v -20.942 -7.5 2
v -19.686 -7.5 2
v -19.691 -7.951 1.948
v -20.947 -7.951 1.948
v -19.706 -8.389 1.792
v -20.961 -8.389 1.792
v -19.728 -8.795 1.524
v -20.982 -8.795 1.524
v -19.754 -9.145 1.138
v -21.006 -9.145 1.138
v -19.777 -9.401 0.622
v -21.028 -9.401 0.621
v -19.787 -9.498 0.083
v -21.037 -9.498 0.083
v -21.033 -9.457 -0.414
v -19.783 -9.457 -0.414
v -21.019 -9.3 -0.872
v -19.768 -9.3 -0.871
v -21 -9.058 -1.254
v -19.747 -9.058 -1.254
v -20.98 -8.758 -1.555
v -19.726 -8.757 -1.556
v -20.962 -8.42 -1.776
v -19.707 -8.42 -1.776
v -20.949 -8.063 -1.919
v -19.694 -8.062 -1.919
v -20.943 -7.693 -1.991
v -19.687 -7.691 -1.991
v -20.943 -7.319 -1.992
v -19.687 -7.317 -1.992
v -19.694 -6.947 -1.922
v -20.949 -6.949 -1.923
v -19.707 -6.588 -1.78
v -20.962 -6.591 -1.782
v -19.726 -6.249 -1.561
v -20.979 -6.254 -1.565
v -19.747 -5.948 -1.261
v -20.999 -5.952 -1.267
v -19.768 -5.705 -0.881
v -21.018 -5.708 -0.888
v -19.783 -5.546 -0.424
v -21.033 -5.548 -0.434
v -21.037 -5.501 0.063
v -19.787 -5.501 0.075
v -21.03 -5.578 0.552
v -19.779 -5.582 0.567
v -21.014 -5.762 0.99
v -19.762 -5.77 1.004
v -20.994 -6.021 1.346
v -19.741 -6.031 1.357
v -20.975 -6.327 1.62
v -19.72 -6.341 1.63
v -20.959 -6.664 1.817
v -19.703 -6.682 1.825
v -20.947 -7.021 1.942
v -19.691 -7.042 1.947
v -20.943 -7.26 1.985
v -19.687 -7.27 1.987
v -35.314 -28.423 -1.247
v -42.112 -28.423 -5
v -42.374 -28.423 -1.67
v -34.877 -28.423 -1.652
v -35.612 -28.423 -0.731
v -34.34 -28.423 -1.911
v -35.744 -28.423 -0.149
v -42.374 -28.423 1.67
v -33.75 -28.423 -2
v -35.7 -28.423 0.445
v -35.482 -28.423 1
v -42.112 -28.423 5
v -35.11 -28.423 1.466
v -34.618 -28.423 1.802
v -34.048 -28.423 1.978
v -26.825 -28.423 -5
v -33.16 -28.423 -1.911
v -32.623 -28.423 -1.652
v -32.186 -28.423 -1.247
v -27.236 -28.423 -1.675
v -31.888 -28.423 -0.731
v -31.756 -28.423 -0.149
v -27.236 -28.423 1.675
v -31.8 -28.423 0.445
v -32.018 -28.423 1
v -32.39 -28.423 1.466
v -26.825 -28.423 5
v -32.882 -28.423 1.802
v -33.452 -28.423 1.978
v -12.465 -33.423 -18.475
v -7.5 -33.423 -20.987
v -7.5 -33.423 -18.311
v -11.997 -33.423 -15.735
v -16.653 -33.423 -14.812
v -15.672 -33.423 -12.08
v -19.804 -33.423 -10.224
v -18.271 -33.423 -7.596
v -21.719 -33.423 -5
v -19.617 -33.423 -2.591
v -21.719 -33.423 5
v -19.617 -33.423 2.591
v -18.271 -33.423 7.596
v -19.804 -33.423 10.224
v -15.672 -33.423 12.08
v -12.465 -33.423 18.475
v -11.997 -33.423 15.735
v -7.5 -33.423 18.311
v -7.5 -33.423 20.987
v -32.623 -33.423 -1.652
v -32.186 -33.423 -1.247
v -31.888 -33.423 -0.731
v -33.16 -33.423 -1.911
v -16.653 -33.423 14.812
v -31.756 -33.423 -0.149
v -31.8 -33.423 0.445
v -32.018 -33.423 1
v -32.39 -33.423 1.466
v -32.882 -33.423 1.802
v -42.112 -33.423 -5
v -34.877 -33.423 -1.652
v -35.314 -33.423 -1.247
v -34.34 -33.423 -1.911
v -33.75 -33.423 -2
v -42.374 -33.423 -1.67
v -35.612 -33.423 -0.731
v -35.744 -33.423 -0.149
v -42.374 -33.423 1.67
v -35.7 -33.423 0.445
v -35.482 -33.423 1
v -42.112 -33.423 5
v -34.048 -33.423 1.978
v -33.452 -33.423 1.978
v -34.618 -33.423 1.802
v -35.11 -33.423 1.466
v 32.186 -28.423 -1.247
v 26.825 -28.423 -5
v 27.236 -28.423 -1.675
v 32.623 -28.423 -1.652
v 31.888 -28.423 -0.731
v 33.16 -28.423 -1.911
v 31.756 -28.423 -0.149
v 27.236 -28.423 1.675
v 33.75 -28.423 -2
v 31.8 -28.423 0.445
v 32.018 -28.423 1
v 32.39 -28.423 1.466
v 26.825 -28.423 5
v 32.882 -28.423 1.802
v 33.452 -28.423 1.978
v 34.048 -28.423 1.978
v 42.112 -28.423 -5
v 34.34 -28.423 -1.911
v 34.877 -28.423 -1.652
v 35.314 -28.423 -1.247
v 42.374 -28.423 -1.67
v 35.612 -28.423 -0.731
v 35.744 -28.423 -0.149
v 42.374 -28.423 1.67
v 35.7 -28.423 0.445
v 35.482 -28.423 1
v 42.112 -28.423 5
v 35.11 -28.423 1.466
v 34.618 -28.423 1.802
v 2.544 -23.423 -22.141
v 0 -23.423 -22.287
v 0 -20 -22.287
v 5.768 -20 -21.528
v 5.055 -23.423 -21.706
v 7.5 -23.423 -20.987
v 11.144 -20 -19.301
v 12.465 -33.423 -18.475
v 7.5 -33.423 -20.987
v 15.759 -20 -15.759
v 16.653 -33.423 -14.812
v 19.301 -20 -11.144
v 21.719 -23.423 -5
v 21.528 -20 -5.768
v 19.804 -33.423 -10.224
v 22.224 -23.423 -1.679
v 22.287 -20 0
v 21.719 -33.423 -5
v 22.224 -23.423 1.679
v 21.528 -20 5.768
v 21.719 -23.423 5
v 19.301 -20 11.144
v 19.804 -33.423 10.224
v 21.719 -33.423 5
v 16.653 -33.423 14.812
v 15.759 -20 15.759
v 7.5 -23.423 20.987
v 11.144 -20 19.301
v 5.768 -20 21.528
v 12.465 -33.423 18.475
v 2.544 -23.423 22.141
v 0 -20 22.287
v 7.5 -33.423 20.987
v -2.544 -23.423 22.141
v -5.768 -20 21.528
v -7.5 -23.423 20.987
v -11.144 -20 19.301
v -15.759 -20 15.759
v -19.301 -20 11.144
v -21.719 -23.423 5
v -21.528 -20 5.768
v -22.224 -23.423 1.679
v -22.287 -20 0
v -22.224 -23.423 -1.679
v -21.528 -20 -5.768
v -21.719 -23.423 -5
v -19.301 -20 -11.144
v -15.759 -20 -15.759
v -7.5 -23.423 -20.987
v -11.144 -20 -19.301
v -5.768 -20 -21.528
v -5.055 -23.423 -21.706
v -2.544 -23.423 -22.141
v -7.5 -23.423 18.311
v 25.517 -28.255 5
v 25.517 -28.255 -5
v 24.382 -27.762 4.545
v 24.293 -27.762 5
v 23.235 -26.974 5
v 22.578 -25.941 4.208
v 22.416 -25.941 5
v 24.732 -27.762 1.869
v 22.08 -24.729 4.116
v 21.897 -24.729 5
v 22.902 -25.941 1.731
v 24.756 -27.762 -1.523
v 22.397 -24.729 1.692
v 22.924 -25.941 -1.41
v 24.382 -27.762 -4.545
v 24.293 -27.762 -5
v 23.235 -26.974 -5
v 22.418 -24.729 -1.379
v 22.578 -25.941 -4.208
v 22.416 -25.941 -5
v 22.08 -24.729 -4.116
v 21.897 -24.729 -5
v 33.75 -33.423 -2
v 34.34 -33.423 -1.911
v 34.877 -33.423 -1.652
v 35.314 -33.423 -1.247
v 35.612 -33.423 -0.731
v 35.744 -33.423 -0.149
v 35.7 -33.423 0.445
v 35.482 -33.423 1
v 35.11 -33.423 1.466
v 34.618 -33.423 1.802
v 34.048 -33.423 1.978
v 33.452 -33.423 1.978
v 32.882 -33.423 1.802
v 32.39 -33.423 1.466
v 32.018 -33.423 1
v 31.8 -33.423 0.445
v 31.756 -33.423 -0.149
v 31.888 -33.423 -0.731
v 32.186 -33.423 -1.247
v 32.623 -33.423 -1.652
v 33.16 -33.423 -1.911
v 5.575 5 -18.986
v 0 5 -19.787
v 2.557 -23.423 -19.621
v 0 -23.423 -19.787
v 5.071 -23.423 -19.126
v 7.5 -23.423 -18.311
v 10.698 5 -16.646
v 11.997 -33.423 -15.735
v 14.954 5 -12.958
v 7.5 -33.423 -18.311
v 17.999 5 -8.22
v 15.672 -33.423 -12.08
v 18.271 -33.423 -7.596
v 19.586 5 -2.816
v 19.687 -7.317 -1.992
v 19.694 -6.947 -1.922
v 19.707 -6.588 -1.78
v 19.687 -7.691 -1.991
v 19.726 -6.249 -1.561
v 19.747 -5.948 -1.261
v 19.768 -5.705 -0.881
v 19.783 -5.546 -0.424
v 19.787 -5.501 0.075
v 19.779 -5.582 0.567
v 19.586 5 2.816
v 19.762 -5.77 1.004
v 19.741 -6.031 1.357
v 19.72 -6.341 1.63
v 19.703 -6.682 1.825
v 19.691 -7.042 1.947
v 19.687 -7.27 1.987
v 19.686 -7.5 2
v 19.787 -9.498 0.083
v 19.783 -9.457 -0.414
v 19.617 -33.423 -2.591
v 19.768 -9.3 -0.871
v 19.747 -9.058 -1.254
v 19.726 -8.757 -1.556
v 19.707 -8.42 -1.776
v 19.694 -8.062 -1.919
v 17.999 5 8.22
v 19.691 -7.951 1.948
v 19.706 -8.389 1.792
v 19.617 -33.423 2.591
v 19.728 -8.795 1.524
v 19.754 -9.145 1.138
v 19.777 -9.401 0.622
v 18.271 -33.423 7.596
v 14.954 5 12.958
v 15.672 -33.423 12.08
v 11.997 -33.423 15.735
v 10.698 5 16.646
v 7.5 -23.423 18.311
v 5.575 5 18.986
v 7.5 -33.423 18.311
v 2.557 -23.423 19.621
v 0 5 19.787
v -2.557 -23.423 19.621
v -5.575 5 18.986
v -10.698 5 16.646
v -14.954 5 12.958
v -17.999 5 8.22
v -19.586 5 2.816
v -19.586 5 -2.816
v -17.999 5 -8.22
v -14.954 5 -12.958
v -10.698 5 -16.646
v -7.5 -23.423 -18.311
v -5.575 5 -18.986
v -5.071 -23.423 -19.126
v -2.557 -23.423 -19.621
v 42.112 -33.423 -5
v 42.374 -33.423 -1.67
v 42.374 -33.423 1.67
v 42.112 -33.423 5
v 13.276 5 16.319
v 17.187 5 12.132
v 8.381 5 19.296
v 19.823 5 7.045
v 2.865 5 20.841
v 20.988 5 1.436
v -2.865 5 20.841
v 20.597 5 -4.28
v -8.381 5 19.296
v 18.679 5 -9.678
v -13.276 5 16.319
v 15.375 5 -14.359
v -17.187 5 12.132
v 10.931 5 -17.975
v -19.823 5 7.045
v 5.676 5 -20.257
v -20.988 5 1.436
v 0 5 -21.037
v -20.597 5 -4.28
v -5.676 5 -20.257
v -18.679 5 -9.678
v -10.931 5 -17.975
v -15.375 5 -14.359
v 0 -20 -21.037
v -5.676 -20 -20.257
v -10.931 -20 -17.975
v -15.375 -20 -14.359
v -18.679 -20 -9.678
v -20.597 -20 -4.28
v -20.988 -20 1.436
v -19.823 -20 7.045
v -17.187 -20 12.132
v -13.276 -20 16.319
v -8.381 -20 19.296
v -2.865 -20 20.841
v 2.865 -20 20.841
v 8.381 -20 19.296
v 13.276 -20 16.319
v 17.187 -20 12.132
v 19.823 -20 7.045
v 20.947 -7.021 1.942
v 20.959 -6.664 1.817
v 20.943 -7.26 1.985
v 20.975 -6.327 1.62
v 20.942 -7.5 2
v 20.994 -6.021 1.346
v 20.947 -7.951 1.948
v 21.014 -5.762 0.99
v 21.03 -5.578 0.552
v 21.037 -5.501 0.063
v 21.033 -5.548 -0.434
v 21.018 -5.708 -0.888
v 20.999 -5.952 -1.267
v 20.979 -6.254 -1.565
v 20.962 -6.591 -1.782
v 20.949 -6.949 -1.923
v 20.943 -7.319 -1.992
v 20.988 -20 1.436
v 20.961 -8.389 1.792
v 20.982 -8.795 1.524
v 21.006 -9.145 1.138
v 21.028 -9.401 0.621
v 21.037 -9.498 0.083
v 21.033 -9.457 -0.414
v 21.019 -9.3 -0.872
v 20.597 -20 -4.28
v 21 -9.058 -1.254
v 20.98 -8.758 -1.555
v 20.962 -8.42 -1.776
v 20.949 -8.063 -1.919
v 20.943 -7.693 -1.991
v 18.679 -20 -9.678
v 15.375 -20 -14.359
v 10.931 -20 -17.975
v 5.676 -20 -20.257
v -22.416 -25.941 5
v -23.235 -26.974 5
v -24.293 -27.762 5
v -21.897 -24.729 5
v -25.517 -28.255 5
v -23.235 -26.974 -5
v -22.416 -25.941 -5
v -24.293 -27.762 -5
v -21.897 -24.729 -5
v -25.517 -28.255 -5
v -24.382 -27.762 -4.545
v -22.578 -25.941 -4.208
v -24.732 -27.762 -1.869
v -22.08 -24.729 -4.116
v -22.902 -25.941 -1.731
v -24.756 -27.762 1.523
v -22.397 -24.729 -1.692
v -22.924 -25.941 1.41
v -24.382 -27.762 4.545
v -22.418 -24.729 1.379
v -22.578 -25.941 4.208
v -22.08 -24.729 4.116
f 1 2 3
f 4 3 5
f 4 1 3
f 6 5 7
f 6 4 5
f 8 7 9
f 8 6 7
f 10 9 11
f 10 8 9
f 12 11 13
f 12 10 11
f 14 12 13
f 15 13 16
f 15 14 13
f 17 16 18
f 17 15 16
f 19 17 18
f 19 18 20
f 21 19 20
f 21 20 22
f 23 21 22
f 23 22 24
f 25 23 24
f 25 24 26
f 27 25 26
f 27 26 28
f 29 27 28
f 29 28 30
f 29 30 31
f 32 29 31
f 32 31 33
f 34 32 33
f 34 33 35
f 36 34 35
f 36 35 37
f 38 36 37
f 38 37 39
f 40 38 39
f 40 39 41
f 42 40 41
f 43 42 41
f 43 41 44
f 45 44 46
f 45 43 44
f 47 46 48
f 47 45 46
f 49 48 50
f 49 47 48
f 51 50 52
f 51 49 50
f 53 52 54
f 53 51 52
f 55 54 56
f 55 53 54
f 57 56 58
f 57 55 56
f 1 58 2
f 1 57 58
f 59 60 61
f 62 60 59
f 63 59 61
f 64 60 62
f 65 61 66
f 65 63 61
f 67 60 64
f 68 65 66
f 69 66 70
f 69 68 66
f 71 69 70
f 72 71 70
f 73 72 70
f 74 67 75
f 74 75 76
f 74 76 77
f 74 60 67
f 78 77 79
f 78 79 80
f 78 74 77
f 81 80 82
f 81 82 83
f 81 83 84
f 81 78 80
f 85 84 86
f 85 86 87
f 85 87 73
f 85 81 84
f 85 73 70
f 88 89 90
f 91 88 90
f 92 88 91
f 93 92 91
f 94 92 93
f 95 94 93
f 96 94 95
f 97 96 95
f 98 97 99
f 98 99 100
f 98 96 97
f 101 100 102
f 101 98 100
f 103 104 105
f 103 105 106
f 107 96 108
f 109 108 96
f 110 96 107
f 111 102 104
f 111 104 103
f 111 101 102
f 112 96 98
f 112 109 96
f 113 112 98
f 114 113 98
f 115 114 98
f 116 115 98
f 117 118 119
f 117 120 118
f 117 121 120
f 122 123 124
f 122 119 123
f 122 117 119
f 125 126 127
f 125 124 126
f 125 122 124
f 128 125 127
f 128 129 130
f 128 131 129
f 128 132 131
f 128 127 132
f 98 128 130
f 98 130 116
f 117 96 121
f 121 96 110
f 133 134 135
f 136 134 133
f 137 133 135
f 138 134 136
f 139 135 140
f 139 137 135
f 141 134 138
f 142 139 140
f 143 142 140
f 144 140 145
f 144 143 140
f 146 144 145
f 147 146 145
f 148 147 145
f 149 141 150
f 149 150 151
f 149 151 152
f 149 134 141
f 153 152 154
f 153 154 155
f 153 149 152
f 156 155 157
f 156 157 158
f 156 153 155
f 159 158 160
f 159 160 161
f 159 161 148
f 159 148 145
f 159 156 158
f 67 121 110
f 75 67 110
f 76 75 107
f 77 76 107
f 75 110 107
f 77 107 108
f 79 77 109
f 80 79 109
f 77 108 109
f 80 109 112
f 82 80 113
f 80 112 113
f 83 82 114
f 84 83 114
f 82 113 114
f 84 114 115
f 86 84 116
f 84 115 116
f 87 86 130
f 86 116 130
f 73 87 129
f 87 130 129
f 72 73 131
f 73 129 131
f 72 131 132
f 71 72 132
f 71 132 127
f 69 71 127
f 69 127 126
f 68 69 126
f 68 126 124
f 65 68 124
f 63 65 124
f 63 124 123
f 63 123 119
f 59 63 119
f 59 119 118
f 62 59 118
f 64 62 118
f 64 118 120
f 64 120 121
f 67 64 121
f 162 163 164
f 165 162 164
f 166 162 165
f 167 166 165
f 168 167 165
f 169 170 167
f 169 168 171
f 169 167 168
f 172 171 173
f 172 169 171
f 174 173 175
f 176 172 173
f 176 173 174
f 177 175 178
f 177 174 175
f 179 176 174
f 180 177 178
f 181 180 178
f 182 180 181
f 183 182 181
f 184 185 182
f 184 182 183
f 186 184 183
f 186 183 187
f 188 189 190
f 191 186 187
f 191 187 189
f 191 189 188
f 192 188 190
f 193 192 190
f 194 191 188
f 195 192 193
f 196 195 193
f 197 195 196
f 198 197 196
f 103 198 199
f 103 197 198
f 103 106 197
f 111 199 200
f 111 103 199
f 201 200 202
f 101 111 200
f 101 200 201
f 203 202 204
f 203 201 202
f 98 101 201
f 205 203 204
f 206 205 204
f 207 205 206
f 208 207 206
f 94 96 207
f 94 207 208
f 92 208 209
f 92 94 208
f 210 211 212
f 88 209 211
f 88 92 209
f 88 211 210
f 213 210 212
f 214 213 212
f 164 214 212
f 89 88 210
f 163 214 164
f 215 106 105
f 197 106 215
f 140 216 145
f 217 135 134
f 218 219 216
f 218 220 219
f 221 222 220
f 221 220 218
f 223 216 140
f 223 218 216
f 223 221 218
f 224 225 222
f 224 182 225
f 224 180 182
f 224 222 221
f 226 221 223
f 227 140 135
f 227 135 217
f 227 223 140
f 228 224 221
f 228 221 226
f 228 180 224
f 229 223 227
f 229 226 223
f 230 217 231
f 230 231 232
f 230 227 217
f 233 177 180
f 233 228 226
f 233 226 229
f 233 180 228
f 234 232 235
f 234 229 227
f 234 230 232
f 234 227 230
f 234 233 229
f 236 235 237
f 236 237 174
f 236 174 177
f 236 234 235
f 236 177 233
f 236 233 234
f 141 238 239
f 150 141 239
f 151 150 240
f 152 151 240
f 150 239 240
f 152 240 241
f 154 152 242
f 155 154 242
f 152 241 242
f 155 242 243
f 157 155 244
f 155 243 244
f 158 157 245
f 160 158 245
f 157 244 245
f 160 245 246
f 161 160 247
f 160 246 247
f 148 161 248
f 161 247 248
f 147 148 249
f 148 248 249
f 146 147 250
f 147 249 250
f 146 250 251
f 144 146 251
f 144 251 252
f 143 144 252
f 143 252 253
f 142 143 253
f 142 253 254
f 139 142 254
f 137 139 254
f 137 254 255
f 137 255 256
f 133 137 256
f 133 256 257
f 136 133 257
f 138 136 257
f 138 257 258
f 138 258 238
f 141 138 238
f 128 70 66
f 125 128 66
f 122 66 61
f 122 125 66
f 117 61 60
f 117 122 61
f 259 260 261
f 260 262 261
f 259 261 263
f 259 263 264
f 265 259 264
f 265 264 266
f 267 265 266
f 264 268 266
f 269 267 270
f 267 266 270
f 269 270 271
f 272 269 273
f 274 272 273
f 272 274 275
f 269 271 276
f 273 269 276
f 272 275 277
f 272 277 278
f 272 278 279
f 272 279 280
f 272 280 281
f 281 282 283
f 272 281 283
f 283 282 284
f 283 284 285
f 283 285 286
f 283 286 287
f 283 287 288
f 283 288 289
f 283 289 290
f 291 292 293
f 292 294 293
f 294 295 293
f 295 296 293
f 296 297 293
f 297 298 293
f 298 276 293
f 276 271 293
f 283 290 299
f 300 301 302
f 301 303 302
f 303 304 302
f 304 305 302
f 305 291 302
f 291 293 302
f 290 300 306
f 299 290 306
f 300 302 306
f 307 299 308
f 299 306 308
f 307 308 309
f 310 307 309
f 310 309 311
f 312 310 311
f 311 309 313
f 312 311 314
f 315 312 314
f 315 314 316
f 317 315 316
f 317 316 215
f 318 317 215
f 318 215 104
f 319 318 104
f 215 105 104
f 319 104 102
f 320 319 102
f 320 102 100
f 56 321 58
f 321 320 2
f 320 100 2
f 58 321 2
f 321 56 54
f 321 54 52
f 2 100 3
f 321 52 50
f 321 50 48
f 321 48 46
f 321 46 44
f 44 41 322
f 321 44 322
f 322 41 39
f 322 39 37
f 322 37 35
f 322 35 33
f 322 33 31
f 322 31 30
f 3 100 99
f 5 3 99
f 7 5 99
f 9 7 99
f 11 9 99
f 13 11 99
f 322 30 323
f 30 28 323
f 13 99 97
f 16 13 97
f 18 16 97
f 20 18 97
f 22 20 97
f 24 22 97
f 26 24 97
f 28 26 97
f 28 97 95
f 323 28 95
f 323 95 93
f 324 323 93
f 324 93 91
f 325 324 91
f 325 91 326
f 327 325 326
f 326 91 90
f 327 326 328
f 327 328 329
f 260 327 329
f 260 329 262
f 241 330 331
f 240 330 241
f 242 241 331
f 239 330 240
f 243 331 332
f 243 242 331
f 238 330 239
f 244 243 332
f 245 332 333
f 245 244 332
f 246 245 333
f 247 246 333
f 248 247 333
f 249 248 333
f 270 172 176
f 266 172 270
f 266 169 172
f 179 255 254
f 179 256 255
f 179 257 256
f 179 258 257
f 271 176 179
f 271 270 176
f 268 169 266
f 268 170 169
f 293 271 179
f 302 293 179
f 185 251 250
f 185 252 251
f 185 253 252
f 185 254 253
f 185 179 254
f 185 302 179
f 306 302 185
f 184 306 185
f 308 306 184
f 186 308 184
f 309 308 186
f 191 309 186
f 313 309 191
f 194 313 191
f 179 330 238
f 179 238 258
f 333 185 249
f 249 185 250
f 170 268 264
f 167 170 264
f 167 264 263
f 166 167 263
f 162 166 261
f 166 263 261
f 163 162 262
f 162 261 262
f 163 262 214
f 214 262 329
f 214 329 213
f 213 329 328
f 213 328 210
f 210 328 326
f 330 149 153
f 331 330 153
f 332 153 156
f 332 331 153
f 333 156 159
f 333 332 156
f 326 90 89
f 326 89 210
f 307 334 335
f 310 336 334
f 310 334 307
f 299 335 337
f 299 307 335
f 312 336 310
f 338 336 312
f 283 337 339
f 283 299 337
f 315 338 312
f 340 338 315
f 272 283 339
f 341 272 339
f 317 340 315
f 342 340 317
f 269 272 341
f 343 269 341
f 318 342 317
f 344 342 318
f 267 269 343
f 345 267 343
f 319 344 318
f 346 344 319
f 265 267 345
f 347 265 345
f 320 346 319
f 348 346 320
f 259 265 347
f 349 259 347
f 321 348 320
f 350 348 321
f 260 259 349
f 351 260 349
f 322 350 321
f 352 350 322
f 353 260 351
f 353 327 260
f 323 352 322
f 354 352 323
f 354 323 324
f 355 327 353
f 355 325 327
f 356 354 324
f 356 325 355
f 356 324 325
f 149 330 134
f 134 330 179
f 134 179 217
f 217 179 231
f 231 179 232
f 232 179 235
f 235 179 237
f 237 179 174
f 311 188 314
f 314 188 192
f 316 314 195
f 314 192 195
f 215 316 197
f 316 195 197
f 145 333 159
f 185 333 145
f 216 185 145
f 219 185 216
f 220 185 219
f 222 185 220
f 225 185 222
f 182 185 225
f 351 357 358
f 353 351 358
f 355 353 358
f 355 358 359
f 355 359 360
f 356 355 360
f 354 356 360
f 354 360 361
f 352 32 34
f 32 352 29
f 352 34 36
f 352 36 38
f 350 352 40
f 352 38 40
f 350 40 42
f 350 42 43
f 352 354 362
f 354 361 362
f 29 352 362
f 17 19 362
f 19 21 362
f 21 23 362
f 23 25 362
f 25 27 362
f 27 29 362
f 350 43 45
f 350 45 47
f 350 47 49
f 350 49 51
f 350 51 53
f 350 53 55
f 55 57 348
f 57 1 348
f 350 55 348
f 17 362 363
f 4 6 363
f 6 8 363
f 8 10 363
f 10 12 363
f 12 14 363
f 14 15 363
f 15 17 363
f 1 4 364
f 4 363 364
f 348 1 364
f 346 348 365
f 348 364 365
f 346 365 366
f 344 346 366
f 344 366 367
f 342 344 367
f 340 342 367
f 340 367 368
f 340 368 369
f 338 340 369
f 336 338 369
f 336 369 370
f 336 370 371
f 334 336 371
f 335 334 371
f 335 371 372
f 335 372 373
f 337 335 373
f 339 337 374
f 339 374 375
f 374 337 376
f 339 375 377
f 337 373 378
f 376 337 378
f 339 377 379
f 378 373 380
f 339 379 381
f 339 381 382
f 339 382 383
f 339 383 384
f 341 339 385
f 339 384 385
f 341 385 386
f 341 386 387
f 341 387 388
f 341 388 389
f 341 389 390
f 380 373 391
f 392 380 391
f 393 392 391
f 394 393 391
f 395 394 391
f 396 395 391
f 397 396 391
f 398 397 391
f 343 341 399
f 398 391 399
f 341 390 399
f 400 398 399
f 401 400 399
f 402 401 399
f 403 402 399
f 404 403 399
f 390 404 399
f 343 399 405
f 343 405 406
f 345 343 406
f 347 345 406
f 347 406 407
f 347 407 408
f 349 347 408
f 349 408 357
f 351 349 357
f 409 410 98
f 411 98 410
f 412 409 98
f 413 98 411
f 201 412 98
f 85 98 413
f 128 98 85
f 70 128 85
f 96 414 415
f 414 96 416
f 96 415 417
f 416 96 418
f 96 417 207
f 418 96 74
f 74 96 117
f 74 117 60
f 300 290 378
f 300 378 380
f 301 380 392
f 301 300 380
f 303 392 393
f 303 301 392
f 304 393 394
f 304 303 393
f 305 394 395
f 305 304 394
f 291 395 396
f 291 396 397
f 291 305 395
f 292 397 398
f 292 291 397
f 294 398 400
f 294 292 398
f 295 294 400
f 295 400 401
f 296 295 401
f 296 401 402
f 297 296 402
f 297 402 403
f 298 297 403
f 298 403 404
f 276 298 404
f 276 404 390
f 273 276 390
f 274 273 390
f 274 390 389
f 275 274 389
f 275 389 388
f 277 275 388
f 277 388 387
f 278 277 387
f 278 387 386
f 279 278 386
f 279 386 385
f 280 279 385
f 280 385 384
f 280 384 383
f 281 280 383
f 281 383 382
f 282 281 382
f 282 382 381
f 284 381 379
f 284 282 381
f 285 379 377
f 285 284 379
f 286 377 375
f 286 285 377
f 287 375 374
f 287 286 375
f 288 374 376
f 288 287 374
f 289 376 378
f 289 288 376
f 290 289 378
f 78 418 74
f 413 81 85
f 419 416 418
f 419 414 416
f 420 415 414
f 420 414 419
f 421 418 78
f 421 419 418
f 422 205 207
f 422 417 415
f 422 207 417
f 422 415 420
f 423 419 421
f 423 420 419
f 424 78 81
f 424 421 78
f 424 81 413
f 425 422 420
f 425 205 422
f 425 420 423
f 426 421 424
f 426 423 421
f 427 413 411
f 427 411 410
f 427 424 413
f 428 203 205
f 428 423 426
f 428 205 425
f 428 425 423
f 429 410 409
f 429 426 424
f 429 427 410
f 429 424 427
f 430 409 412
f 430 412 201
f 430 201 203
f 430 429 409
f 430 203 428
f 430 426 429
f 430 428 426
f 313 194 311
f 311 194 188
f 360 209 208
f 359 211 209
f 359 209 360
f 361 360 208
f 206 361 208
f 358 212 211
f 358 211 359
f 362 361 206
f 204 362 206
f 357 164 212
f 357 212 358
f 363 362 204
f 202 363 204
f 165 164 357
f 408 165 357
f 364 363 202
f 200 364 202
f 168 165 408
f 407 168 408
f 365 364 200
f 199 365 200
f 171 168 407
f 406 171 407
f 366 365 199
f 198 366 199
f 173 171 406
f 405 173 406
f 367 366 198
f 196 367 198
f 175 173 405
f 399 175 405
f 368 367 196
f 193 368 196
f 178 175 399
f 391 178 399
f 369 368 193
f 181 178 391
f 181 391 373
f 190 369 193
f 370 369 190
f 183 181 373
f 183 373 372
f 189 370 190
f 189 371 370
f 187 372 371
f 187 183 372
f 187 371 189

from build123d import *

# Parameters (mm, degrees)
SKETCH1_R                = 34
BOSS_EXTRUDE1_DEPTH      = 10
SKETCH2_R                = 19.7871926
SKETCH2_R_2              = 2
CUT_EXTRUDE1_DEPTH       = 10
SKETCH3_R                = 4.837531333
SKETCH4_W                = 4.837531333
SKETCH4_H                = 4.837531333
CUT_EXTRUDE3_DEPTH       = 38
CUT_EXTRUDE3_DEPTH_BACK  = 38
SKETCH5_W                = 72.361656805
SKETCH5_H                = 8.896778435
BOSS_EXTRUDE2_START      = 60
SKETCH6_R                = 22.2871926
SKETCH6_R_2              = 19.7871926
BOSS_EXTRUDE2_DEPTH      = 60
SKETCH7_R                = 21.0371926
SKETCH7_R_2              = 19.7871926
CUT_EXTRUDE4_DEPTH       = 25
CUT_EXTRUDE6_DEPTH       = 25
CUT_EXTRUDE6_DEPTH_BACK  = 25
SKETCH8_R                = 2
CUT_EXTRUDE7_DEPTH       = 43
CUT_EXTRUDE7_DEPTH_BACK  = 53
SKETCH9_W                = 69.351432881
SKETCH9_H                = 5.737807944
CUT_EXTRUDE8_START       = -25
SKETCH10_R               = 22.2871926
SKETCH10_R_2             = 21.0371926
CUT_EXTRUDE8_DEPTH       = 25
CUT_EXTRUDE9_DEPTH       = 30
CUT_EXTRUDE9_DEPTH_BACK  = 30
SKETCH11_R               = 2
CUT_EXTRUDE10_DEPTH      = 30
CUT_EXTRUDE10_DEPTH_BACK = 30
SKETCH12_W               = 44.5743852
SKETCH12_H               = 21.576749043
BOSS_EXTRUDE3_DEPTH      = 66
BOSS_EXTRUDE3_DEPTH_BACK = 54
SKETCH13_W               = 10
SKETCH13_H               = 10
CUT_EXTRUDE11_START      = -66
SKETCH14_R               = 19.7871926
CUT_EXTRUDE11_DEPTH      = 66
SKETCH18_W               = 9.329915791
SKETCH18_H               = 10
CUT_EXTRUDE12_DEPTH      = 66
SKETCH19_R               = 2
CUT_EXTRUDE13_DEPTH      = 66
SKETCH20_R               = 58.570053226
SKETCH20_R_2             = 42.40739525
CUT_EXTRUDE14_DEPTH      = 66
SKETCH22_R               = 21.0371926
SKETCH22_R_2             = 19.7871926
BOSS_EXTRUDE4_DEPTH      = 12
CUT_EXTRUDE15_DEPTH      = 66
CUT_EXTRUDE15_DEPTH_BACK = 66
SKETCH21_W               = 15
SKETCH21_H               = 10


with BuildPart() as part:
    # Sketch1 → Boss-Extrude1 (new body)
    with BuildSketch(Plane(origin=(0, 0, 0), x_dir=(1, 0, 0), z_dir=(0, 1, 0))):
        Circle(SKETCH1_R)
    extrude(amount=BOSS_EXTRUDE1_DEPTH)

    # Sketch2 → Cut-Extrude1 (cut)
    with BuildSketch(Plane.XZ):
        Circle(SKETCH2_R)
        with Locations((-22.1, 12.5)):
            Circle(SKETCH2_R_2)
        with Locations((22.1, 12.5)):
            Circle(SKETCH2_R_2)
        with Locations((22.1, -12.5)):
            Circle(SKETCH2_R_2)
        with Locations((-22.1, -12.5)):
            Circle(SKETCH2_R_2)
    extrude(amount=-CUT_EXTRUDE1_DEPTH, mode=Mode.SUBTRACT)

    # Sketch3 → Cut-Revolve1 (revolve, cut)
    with BuildSketch(Plane(origin=(0, 0, 0), x_dir=(0, 0, -1), z_dir=(1, 0, 0))):
        with Locations((-34, 5)):
            Circle(SKETCH3_R)
    revolve(axis=Axis((0, 0, 0), (0, 1, 0)), mode=Mode.SUBTRACT)

    # Sketch4 → Cut-Revolve2 (revolve, cut)
    with BuildSketch(Plane(origin=(0, 0, 0), x_dir=(0, 0, -1), z_dir=(1, 0, 0))):
        with Locations((-31.581234333, 2.581234333)):
            Rectangle(SKETCH4_W, SKETCH4_H)
    revolve(axis=Axis((0, 0, 0), (0, 1, 0)), mode=Mode.SUBTRACT)

    # Sketch5 → Cut-Extrude3 (cut, two sides: drawn at the far end of the back side and taken through both)
    with BuildSketch(Plane(origin=(0, 0, 0), x_dir=(0, 0, -1), z_dir=(1, 0, 0)).offset(-CUT_EXTRUDE3_DEPTH_BACK)):
        with Locations((-0.901301775, 0.551610782)):
            Rectangle(SKETCH5_W, SKETCH5_H)
    extrude(amount=CUT_EXTRUDE3_DEPTH + CUT_EXTRUDE3_DEPTH_BACK, mode=Mode.SUBTRACT)

    # Sketch6 → Boss-Extrude2 (add)
    with BuildSketch(Plane.XZ.offset(-5).offset(BOSS_EXTRUDE2_START)):
        Circle(SKETCH6_R)
        Circle(SKETCH6_R_2, mode=Mode.SUBTRACT)
    extrude(amount=-BOSS_EXTRUDE2_DEPTH)

    # Sketch7 → Cut-Extrude4 (cut)
    with BuildSketch(Plane.XZ.offset(55)):
        Circle(SKETCH7_R)
        Circle(SKETCH7_R_2, mode=Mode.SUBTRACT)
    extrude(amount=-CUT_EXTRUDE4_DEPTH, mode=Mode.SUBTRACT)

    # Sketch8 → Cut-Extrude6 (cut, two sides: drawn at the far end of the back side and taken through both)
    with BuildSketch(Plane(origin=(0, 0, 0), x_dir=(0, 0, -1), z_dir=(1, 0, 0)).offset(-CUT_EXTRUDE6_DEPTH_BACK)):
        with Locations((0, -42.5)):
            Circle(SKETCH8_R)
    extrude(amount=CUT_EXTRUDE6_DEPTH + CUT_EXTRUDE6_DEPTH_BACK, mode=Mode.SUBTRACT)

    # Sketch9 → Cut-Extrude7 (cut, two sides: drawn at the far end of the back side and taken through both)
    with BuildSketch(Plane(origin=(0, 0, 0), x_dir=(0, 0, -1), z_dir=(1, 0, 0)).offset(-CUT_EXTRUDE7_DEPTH_BACK)):
        with Locations((0.165912519, 7.868903972)):
            Rectangle(SKETCH9_W, SKETCH9_H)
    extrude(amount=CUT_EXTRUDE7_DEPTH + CUT_EXTRUDE7_DEPTH_BACK, mode=Mode.SUBTRACT)

    # Sketch10 → Cut-Extrude8 (cut)
    with BuildSketch(Plane(origin=(0, 5, 0), x_dir=(1, 0, 0), z_dir=(0, 1, 0)).offset(CUT_EXTRUDE8_START)):
        Circle(SKETCH10_R)
        Circle(SKETCH10_R_2, mode=Mode.SUBTRACT)
    extrude(amount=CUT_EXTRUDE8_DEPTH, mode=Mode.SUBTRACT)

    # Sketch11 → Cut-Extrude9 (cut, two sides: drawn at the far end of the back side and taken through both)
    with BuildSketch(Plane(origin=(0, 0, 0), x_dir=(0, 0, -1), z_dir=(1, 0, 0)).offset(-CUT_EXTRUDE9_DEPTH_BACK)):
        with Locations((0, -7.5)):
            Circle(SKETCH11_R)
    extrude(amount=CUT_EXTRUDE9_DEPTH + CUT_EXTRUDE9_DEPTH_BACK, mode=Mode.SUBTRACT)

    # Sketch12 → Cut-Extrude10 (cut, two sides: drawn at the far end of the back side and taken through both)
    with BuildSketch(Plane(origin=(0, 0, 0), x_dir=(0, 0, -1), z_dir=(1, 0, 0)).offset(-CUT_EXTRUDE10_DEPTH_BACK)):
        with Locations((0, -44.211625478)):
            Rectangle(SKETCH12_W, SKETCH12_H)
    extrude(amount=CUT_EXTRUDE10_DEPTH + CUT_EXTRUDE10_DEPTH_BACK, mode=Mode.SUBTRACT)

    # Sketch13 → Boss-Extrude3 (add, two sides: drawn at the far end of the back side and taken through both)
    with BuildSketch(Plane(origin=(0, 0, 0), x_dir=(0, 0, -1), z_dir=(1, 0, 0)).offset(-BOSS_EXTRUDE3_DEPTH_BACK)):
        with Locations((0, -28.423250957)):
            Rectangle(SKETCH13_W, SKETCH13_H)
    extrude(amount=BOSS_EXTRUDE3_DEPTH + BOSS_EXTRUDE3_DEPTH_BACK)

    # Sketch14 → Cut-Extrude11 (cut)
    with BuildSketch(Plane(origin=(0, -23.423250957, 0), x_dir=(1, 0, 0), z_dir=(0, 1, 0)).offset(CUT_EXTRUDE11_START)):
        Circle(SKETCH14_R)
    extrude(amount=CUT_EXTRUDE11_DEPTH, mode=Mode.SUBTRACT)

    # Sketch17 → Cut-Revolve5 (revolve, cut)
    with BuildSketch(Plane.XY):
        with BuildLine():
            Line((-32.2871926, -23.423250957), (-56.890231537, -23.423250957))
            Line((-56.890231537, -23.423250957), (-56.890231537, -28.423250957))
            Line((-56.890231537, -28.423250957), (-27.2871926, -28.423250957))
            ThreePointArc((-27.2871926, -28.423250957), (-23.751658694, -19.887717051), (-32.2871926, -23.423250957))
        make_face()
    revolve(axis=Axis((0, -33.423250957, 0), (0, 1, 0)), mode=Mode.SUBTRACT)

    # Sketch18 → Cut-Extrude12 (cut)
    with BuildSketch(Plane.XY.offset(5)):
        with Locations((61.335042105, -28.423250957)):
            Rectangle(SKETCH18_W, SKETCH18_H)
    extrude(amount=-CUT_EXTRUDE12_DEPTH, mode=Mode.SUBTRACT)

    # Sketch19 → Cut-Extrude13 (cut)
    with BuildSketch(Plane.XZ.offset(33.423250957)):
        with Locations((-33.75, 0)):
            Circle(SKETCH19_R)
        with Locations((33.75, 0)):
            Circle(SKETCH19_R)
    extrude(amount=-CUT_EXTRUDE13_DEPTH, mode=Mode.SUBTRACT)

    # Sketch20 → Cut-Extrude14 (cut)
    with BuildSketch(Plane.XZ.offset(33.423250957)):
        Circle(SKETCH20_R)
        Circle(SKETCH20_R_2, mode=Mode.SUBTRACT)
    extrude(amount=-CUT_EXTRUDE14_DEPTH, mode=Mode.SUBTRACT)

    # Sketch22 → Boss-Extrude4 (add)
    with BuildSketch(Plane.XZ.offset(33.423250957)):
        Circle(SKETCH22_R)
        Circle(SKETCH22_R_2, mode=Mode.SUBTRACT)
    extrude(amount=-BOSS_EXTRUDE4_DEPTH)

    # Sketch21 → Cut-Extrude15 (cut, two sides: drawn at the far end of the back side and taken through both)
    with BuildSketch(Plane(origin=(0, 0, -5), x_dir=(-1, 0, 0), z_dir=(0, 0, -1)).offset(-CUT_EXTRUDE15_DEPTH_BACK)):
        with Locations((0, -28.423250957)):
            Rectangle(SKETCH21_W, SKETCH21_H)
    extrude(amount=CUT_EXTRUDE15_DEPTH + CUT_EXTRUDE15_DEPTH_BACK, mode=Mode.SUBTRACT)


solid = part.part
